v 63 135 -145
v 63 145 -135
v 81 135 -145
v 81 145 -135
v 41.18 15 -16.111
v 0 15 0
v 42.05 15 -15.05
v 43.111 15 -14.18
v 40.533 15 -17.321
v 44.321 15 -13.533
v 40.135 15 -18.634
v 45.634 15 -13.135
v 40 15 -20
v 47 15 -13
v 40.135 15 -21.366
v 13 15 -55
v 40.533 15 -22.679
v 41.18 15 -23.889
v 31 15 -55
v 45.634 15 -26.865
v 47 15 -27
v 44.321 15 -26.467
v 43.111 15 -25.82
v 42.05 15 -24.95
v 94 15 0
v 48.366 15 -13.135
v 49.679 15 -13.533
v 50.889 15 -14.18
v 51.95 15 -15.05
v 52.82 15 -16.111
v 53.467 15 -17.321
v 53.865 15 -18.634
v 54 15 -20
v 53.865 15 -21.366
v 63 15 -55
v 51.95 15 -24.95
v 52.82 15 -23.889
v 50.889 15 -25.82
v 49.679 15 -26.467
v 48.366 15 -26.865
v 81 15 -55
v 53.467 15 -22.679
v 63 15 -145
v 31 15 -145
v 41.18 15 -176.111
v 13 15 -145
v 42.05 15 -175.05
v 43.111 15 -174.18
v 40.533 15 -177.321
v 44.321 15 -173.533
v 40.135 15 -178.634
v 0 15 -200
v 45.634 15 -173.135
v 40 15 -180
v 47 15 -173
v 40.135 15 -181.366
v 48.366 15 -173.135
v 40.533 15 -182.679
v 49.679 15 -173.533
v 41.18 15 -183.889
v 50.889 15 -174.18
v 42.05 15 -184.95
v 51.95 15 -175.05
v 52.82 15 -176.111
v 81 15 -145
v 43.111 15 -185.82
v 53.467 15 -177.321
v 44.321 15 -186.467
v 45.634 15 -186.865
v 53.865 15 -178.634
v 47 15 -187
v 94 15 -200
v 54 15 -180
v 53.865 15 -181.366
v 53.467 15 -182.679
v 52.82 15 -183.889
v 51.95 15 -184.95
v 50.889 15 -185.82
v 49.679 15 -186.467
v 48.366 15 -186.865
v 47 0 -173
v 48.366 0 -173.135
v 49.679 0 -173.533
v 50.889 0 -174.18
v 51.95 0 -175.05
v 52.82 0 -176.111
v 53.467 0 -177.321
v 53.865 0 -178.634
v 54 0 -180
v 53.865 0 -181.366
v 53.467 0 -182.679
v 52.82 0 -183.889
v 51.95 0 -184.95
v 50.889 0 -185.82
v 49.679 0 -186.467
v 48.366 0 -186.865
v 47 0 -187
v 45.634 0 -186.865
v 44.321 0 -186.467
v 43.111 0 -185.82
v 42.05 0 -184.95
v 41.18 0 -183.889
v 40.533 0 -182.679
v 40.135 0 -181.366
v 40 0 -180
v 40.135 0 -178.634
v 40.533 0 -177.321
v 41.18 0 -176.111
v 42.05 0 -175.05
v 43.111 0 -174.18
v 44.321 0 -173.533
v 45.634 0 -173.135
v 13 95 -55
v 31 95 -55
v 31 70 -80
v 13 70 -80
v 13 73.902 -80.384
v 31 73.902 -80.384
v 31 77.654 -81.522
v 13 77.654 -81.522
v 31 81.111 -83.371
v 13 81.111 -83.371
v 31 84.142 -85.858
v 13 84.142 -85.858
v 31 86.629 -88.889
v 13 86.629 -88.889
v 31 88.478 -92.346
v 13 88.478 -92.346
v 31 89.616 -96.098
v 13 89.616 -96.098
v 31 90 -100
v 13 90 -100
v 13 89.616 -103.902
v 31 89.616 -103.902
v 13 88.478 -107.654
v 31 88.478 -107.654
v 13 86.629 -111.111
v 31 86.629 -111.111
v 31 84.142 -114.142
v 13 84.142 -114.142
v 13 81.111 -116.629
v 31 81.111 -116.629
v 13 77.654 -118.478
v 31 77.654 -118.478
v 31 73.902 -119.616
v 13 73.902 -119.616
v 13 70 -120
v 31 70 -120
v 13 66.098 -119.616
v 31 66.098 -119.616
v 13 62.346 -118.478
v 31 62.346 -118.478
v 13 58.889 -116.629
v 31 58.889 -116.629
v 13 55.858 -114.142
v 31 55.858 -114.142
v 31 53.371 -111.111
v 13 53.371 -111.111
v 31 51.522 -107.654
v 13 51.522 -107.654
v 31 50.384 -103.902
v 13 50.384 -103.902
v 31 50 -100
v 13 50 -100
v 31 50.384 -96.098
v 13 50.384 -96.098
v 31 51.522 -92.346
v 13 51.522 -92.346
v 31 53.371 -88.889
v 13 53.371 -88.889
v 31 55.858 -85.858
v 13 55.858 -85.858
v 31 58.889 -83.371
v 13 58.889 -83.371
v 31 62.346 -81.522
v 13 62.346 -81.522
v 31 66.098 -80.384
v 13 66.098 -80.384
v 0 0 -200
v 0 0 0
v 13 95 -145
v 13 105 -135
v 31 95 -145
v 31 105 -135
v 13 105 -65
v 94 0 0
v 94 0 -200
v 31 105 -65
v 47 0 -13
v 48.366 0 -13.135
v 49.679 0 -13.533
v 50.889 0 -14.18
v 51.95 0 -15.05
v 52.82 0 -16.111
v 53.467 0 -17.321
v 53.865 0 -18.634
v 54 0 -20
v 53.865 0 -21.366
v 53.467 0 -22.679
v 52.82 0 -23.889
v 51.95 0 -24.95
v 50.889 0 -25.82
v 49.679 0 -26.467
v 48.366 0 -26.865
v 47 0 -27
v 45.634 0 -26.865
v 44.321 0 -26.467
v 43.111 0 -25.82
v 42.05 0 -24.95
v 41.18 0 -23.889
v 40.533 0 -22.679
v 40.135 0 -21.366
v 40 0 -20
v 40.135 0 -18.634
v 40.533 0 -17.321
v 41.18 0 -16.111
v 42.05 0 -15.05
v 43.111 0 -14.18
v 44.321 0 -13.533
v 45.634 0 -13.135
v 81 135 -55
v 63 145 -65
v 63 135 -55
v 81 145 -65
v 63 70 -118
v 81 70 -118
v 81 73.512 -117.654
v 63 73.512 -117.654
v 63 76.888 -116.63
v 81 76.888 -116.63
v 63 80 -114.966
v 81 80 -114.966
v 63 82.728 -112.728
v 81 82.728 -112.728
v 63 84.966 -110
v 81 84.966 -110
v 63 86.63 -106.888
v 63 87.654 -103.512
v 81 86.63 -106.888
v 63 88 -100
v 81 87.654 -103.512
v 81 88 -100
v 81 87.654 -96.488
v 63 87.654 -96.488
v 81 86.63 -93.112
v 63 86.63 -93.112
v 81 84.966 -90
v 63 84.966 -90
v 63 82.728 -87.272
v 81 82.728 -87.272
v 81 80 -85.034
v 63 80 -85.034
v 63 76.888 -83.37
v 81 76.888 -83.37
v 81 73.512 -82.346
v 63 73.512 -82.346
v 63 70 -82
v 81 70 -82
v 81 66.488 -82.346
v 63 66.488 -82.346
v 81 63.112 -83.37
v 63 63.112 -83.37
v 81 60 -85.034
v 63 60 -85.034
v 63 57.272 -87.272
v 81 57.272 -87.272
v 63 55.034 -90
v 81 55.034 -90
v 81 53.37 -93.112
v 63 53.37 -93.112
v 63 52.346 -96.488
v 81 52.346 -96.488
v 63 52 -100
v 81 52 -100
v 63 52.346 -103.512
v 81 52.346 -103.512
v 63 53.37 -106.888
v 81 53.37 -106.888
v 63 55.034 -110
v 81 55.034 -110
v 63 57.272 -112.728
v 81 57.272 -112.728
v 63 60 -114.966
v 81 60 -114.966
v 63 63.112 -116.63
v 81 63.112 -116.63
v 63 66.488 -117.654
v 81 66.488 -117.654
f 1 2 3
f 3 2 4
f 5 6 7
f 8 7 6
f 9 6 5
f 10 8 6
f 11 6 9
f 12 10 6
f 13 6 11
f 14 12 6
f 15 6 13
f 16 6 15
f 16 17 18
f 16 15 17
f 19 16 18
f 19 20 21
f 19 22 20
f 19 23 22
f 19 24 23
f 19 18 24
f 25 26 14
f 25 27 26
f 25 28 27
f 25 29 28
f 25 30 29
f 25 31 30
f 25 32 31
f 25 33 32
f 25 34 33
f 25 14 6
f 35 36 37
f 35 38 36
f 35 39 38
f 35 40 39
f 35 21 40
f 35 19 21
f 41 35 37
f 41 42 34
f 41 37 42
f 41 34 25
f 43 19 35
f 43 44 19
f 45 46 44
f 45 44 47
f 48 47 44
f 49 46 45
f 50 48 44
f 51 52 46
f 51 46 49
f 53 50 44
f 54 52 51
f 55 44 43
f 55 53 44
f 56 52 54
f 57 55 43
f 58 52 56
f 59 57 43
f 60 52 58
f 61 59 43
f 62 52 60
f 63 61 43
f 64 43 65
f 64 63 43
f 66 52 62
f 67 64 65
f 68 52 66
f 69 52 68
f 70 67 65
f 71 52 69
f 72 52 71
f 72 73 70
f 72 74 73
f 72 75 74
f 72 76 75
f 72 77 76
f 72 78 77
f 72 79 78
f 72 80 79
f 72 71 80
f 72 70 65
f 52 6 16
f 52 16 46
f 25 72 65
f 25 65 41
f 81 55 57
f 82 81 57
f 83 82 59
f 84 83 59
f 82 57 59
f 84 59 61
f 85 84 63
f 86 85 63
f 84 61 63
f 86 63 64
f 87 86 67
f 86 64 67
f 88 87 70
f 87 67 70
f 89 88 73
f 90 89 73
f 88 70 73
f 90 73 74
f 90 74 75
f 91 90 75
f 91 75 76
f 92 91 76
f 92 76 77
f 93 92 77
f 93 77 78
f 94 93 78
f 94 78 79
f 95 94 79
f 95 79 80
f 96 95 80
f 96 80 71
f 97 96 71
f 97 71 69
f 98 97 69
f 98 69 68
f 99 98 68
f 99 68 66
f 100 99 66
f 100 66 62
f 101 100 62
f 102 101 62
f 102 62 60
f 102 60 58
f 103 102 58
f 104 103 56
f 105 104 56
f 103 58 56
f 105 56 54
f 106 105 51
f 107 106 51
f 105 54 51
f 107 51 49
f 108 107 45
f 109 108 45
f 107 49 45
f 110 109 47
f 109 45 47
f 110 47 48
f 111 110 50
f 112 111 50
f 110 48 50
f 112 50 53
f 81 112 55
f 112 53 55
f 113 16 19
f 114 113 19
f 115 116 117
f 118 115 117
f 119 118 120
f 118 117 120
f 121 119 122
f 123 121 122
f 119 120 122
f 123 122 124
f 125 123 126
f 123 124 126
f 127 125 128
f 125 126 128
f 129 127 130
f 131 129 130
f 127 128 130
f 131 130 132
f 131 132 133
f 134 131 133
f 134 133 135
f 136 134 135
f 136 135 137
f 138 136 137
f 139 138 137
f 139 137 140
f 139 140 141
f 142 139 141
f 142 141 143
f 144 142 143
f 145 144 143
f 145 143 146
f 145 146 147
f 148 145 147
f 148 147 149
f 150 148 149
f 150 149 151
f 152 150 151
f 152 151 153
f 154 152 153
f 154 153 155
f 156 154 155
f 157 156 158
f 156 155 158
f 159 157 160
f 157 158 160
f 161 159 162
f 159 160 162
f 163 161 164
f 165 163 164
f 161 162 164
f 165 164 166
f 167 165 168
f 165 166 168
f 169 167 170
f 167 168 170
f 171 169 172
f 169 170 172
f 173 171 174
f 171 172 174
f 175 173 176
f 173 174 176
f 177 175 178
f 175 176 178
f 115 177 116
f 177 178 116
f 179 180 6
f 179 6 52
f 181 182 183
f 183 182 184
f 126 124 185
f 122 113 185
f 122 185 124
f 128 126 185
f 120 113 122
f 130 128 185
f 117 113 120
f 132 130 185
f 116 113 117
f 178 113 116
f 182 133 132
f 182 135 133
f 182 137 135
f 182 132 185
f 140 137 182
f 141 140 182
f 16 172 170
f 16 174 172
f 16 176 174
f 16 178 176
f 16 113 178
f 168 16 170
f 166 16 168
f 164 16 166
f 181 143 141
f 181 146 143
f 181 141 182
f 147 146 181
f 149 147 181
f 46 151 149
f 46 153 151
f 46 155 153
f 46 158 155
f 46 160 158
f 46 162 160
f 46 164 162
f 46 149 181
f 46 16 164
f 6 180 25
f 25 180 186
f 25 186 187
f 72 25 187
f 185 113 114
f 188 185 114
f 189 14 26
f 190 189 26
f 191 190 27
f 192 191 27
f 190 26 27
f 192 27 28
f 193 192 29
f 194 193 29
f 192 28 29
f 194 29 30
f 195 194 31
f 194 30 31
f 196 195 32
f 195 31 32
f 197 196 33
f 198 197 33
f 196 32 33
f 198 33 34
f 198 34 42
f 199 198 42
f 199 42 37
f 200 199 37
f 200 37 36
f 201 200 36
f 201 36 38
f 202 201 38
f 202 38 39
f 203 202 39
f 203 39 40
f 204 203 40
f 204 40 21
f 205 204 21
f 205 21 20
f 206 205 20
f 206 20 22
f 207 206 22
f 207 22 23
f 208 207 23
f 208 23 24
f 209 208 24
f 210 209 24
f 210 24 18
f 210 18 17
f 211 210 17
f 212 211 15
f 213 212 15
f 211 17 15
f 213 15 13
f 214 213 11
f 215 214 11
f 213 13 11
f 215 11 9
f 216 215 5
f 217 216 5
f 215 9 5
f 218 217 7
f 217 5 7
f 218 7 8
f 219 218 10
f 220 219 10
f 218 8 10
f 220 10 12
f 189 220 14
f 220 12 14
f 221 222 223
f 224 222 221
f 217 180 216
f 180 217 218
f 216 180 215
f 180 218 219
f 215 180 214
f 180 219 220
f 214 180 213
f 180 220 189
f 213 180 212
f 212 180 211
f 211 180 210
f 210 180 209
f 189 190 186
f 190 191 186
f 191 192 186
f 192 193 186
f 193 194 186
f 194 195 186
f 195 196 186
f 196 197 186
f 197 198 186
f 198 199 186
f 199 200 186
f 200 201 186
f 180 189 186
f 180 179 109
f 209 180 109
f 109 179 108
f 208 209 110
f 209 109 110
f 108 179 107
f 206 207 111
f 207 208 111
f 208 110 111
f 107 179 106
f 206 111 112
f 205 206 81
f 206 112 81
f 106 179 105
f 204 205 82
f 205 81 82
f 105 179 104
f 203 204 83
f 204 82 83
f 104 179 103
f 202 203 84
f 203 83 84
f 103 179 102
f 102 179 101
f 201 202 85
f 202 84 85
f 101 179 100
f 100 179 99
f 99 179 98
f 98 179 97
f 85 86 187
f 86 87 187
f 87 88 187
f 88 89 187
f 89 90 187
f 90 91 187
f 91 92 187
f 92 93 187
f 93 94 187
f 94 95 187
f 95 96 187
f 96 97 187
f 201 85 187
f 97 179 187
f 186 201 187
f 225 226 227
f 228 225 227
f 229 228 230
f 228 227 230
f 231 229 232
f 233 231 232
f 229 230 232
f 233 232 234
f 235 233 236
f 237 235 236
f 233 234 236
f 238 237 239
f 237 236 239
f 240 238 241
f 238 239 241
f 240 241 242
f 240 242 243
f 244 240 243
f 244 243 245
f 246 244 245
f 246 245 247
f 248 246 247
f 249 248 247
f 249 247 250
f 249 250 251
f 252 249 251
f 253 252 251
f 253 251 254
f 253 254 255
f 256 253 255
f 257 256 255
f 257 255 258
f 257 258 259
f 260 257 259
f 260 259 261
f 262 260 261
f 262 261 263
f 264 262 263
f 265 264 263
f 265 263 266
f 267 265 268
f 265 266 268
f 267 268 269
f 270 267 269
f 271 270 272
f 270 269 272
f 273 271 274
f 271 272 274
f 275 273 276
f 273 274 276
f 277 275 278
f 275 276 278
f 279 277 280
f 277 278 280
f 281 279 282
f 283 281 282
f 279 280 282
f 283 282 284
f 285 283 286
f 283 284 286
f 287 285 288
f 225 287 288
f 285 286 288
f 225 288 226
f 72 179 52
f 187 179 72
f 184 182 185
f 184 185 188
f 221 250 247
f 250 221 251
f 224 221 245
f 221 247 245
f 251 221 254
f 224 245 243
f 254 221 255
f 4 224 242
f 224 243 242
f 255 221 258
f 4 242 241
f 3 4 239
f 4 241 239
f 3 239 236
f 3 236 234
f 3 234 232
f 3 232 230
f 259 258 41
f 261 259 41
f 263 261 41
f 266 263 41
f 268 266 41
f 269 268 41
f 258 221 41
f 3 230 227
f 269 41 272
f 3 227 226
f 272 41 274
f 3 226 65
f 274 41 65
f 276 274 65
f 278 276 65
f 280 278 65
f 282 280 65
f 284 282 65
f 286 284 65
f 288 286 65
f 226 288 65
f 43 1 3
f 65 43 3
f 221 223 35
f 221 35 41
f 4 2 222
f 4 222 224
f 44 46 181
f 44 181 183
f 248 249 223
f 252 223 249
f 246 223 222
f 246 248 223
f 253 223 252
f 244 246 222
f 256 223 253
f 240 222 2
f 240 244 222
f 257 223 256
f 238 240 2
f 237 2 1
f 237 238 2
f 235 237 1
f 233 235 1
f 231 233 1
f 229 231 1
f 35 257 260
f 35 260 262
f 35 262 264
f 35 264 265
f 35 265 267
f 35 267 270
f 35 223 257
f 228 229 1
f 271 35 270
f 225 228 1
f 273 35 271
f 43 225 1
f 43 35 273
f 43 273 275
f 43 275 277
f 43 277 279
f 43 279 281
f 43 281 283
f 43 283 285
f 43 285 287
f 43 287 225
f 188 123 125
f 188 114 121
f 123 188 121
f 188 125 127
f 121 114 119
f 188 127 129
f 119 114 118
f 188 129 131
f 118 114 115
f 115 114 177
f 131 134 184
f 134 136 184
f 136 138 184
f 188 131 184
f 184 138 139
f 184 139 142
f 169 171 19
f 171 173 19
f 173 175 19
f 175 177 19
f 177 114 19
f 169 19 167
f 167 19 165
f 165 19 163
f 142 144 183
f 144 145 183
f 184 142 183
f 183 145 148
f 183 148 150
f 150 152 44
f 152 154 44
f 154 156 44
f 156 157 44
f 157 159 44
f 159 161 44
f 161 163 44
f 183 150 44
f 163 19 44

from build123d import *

# Parameters (mm, degrees)
SCHIZZO1_W        = 94
SCHIZZO1_H        = 200
ESTRUSIONE1_DEPTH = 15
SCHIZZO2_W        = 18
SCHIZZO2_H        = 90
ESTRUSIONE2_DEPTH = 90
SCHIZZO3_R        = 7
ESTRUSIONE3_DEPTH = 90
SCHIZZO4_R        = 18
ESTRUSIONE4_DEPTH = 240.970831561
SCHIZZO5_R        = 20
ESTRUSIONE5_DEPTH = 20
SCHIZZO7_W        = 18
SCHIZZO7_H        = 90
ESTRUSIONE6_DEPTH = 40
SMUSSO1_SIZE      = 10


with BuildPart() as part:
    # Schizzo1 → Estrusione1 (new body)
    with BuildSketch(Plane(origin=(0, 0, 0), x_dir=(1, 0, 0), z_dir=(0, 1, 0))):
        with Locations((47, 100)):
            Rectangle(SCHIZZO1_W, SCHIZZO1_H)
    extrude(amount=ESTRUSIONE1_DEPTH)

    # Schizzo2 → Estrusione2 (add)
    with BuildSketch(Plane(origin=(0, 15, 0), x_dir=(1, 0, 0), z_dir=(0, 1, 0))):
        with Locations((72, 100)):
            Rectangle(SCHIZZO2_W, SCHIZZO2_H)
        with Locations((22, 100)):
            Rectangle(SCHIZZO2_W, SCHIZZO2_H)
    extrude(amount=ESTRUSIONE2_DEPTH)

    # Schizzo3 → Estrusione3 (cut)
    with BuildSketch(Plane(origin=(0, 15, 0), x_dir=(1, 0, 0), z_dir=(0, 1, 0))):
        with Locations(Location((47, 180, 0), (0, 0, 270))):
            Circle(SCHIZZO3_R)
        with Locations(Location((47, 20, 0), (0, 0, 270))):
            Circle(SCHIZZO3_R)
    extrude(amount=-ESTRUSIONE3_DEPTH, mode=Mode.SUBTRACT)

    # Schizzo4 → Estrusione4 (cut, through all)
    with BuildSketch(Plane(origin=(81, 0, 0), x_dir=(0, 0, -1), z_dir=(1, 0, 0))):
        with Locations((100, 70)):
            Circle(SCHIZZO4_R)
    extrude(amount=-ESTRUSIONE4_DEPTH, mode=Mode.SUBTRACT)

    # Schizzo5 → Estrusione5 (cut)
    with BuildSketch(Plane.ZY.offset(-13)):
        with Locations((-100, 70)):
            Circle(SCHIZZO5_R)
    extrude(amount=-ESTRUSIONE5_DEPTH, mode=Mode.SUBTRACT)

    # Schizzo7 → Estrusione6 (add)
    with BuildSketch(Plane(origin=(0, 105, 0), x_dir=(1, 0, 0), z_dir=(0, 1, 0))):
        with Locations((72, 100)):
            Rectangle(SCHIZZO7_W, SCHIZZO7_H)
    extrude(amount=ESTRUSIONE6_DEPTH)

    # Smusso1
    smusso1_edges = [part.edges().sort_by_distance(p)[0] for p in [
        (22, 105, -55),
        (22, 105, -145),
        (72, 145, -55),
        (72, 145, -145),
    ]]
    chamfer(smusso1_edges, length=SMUSSO1_SIZE)


solid = part.part
